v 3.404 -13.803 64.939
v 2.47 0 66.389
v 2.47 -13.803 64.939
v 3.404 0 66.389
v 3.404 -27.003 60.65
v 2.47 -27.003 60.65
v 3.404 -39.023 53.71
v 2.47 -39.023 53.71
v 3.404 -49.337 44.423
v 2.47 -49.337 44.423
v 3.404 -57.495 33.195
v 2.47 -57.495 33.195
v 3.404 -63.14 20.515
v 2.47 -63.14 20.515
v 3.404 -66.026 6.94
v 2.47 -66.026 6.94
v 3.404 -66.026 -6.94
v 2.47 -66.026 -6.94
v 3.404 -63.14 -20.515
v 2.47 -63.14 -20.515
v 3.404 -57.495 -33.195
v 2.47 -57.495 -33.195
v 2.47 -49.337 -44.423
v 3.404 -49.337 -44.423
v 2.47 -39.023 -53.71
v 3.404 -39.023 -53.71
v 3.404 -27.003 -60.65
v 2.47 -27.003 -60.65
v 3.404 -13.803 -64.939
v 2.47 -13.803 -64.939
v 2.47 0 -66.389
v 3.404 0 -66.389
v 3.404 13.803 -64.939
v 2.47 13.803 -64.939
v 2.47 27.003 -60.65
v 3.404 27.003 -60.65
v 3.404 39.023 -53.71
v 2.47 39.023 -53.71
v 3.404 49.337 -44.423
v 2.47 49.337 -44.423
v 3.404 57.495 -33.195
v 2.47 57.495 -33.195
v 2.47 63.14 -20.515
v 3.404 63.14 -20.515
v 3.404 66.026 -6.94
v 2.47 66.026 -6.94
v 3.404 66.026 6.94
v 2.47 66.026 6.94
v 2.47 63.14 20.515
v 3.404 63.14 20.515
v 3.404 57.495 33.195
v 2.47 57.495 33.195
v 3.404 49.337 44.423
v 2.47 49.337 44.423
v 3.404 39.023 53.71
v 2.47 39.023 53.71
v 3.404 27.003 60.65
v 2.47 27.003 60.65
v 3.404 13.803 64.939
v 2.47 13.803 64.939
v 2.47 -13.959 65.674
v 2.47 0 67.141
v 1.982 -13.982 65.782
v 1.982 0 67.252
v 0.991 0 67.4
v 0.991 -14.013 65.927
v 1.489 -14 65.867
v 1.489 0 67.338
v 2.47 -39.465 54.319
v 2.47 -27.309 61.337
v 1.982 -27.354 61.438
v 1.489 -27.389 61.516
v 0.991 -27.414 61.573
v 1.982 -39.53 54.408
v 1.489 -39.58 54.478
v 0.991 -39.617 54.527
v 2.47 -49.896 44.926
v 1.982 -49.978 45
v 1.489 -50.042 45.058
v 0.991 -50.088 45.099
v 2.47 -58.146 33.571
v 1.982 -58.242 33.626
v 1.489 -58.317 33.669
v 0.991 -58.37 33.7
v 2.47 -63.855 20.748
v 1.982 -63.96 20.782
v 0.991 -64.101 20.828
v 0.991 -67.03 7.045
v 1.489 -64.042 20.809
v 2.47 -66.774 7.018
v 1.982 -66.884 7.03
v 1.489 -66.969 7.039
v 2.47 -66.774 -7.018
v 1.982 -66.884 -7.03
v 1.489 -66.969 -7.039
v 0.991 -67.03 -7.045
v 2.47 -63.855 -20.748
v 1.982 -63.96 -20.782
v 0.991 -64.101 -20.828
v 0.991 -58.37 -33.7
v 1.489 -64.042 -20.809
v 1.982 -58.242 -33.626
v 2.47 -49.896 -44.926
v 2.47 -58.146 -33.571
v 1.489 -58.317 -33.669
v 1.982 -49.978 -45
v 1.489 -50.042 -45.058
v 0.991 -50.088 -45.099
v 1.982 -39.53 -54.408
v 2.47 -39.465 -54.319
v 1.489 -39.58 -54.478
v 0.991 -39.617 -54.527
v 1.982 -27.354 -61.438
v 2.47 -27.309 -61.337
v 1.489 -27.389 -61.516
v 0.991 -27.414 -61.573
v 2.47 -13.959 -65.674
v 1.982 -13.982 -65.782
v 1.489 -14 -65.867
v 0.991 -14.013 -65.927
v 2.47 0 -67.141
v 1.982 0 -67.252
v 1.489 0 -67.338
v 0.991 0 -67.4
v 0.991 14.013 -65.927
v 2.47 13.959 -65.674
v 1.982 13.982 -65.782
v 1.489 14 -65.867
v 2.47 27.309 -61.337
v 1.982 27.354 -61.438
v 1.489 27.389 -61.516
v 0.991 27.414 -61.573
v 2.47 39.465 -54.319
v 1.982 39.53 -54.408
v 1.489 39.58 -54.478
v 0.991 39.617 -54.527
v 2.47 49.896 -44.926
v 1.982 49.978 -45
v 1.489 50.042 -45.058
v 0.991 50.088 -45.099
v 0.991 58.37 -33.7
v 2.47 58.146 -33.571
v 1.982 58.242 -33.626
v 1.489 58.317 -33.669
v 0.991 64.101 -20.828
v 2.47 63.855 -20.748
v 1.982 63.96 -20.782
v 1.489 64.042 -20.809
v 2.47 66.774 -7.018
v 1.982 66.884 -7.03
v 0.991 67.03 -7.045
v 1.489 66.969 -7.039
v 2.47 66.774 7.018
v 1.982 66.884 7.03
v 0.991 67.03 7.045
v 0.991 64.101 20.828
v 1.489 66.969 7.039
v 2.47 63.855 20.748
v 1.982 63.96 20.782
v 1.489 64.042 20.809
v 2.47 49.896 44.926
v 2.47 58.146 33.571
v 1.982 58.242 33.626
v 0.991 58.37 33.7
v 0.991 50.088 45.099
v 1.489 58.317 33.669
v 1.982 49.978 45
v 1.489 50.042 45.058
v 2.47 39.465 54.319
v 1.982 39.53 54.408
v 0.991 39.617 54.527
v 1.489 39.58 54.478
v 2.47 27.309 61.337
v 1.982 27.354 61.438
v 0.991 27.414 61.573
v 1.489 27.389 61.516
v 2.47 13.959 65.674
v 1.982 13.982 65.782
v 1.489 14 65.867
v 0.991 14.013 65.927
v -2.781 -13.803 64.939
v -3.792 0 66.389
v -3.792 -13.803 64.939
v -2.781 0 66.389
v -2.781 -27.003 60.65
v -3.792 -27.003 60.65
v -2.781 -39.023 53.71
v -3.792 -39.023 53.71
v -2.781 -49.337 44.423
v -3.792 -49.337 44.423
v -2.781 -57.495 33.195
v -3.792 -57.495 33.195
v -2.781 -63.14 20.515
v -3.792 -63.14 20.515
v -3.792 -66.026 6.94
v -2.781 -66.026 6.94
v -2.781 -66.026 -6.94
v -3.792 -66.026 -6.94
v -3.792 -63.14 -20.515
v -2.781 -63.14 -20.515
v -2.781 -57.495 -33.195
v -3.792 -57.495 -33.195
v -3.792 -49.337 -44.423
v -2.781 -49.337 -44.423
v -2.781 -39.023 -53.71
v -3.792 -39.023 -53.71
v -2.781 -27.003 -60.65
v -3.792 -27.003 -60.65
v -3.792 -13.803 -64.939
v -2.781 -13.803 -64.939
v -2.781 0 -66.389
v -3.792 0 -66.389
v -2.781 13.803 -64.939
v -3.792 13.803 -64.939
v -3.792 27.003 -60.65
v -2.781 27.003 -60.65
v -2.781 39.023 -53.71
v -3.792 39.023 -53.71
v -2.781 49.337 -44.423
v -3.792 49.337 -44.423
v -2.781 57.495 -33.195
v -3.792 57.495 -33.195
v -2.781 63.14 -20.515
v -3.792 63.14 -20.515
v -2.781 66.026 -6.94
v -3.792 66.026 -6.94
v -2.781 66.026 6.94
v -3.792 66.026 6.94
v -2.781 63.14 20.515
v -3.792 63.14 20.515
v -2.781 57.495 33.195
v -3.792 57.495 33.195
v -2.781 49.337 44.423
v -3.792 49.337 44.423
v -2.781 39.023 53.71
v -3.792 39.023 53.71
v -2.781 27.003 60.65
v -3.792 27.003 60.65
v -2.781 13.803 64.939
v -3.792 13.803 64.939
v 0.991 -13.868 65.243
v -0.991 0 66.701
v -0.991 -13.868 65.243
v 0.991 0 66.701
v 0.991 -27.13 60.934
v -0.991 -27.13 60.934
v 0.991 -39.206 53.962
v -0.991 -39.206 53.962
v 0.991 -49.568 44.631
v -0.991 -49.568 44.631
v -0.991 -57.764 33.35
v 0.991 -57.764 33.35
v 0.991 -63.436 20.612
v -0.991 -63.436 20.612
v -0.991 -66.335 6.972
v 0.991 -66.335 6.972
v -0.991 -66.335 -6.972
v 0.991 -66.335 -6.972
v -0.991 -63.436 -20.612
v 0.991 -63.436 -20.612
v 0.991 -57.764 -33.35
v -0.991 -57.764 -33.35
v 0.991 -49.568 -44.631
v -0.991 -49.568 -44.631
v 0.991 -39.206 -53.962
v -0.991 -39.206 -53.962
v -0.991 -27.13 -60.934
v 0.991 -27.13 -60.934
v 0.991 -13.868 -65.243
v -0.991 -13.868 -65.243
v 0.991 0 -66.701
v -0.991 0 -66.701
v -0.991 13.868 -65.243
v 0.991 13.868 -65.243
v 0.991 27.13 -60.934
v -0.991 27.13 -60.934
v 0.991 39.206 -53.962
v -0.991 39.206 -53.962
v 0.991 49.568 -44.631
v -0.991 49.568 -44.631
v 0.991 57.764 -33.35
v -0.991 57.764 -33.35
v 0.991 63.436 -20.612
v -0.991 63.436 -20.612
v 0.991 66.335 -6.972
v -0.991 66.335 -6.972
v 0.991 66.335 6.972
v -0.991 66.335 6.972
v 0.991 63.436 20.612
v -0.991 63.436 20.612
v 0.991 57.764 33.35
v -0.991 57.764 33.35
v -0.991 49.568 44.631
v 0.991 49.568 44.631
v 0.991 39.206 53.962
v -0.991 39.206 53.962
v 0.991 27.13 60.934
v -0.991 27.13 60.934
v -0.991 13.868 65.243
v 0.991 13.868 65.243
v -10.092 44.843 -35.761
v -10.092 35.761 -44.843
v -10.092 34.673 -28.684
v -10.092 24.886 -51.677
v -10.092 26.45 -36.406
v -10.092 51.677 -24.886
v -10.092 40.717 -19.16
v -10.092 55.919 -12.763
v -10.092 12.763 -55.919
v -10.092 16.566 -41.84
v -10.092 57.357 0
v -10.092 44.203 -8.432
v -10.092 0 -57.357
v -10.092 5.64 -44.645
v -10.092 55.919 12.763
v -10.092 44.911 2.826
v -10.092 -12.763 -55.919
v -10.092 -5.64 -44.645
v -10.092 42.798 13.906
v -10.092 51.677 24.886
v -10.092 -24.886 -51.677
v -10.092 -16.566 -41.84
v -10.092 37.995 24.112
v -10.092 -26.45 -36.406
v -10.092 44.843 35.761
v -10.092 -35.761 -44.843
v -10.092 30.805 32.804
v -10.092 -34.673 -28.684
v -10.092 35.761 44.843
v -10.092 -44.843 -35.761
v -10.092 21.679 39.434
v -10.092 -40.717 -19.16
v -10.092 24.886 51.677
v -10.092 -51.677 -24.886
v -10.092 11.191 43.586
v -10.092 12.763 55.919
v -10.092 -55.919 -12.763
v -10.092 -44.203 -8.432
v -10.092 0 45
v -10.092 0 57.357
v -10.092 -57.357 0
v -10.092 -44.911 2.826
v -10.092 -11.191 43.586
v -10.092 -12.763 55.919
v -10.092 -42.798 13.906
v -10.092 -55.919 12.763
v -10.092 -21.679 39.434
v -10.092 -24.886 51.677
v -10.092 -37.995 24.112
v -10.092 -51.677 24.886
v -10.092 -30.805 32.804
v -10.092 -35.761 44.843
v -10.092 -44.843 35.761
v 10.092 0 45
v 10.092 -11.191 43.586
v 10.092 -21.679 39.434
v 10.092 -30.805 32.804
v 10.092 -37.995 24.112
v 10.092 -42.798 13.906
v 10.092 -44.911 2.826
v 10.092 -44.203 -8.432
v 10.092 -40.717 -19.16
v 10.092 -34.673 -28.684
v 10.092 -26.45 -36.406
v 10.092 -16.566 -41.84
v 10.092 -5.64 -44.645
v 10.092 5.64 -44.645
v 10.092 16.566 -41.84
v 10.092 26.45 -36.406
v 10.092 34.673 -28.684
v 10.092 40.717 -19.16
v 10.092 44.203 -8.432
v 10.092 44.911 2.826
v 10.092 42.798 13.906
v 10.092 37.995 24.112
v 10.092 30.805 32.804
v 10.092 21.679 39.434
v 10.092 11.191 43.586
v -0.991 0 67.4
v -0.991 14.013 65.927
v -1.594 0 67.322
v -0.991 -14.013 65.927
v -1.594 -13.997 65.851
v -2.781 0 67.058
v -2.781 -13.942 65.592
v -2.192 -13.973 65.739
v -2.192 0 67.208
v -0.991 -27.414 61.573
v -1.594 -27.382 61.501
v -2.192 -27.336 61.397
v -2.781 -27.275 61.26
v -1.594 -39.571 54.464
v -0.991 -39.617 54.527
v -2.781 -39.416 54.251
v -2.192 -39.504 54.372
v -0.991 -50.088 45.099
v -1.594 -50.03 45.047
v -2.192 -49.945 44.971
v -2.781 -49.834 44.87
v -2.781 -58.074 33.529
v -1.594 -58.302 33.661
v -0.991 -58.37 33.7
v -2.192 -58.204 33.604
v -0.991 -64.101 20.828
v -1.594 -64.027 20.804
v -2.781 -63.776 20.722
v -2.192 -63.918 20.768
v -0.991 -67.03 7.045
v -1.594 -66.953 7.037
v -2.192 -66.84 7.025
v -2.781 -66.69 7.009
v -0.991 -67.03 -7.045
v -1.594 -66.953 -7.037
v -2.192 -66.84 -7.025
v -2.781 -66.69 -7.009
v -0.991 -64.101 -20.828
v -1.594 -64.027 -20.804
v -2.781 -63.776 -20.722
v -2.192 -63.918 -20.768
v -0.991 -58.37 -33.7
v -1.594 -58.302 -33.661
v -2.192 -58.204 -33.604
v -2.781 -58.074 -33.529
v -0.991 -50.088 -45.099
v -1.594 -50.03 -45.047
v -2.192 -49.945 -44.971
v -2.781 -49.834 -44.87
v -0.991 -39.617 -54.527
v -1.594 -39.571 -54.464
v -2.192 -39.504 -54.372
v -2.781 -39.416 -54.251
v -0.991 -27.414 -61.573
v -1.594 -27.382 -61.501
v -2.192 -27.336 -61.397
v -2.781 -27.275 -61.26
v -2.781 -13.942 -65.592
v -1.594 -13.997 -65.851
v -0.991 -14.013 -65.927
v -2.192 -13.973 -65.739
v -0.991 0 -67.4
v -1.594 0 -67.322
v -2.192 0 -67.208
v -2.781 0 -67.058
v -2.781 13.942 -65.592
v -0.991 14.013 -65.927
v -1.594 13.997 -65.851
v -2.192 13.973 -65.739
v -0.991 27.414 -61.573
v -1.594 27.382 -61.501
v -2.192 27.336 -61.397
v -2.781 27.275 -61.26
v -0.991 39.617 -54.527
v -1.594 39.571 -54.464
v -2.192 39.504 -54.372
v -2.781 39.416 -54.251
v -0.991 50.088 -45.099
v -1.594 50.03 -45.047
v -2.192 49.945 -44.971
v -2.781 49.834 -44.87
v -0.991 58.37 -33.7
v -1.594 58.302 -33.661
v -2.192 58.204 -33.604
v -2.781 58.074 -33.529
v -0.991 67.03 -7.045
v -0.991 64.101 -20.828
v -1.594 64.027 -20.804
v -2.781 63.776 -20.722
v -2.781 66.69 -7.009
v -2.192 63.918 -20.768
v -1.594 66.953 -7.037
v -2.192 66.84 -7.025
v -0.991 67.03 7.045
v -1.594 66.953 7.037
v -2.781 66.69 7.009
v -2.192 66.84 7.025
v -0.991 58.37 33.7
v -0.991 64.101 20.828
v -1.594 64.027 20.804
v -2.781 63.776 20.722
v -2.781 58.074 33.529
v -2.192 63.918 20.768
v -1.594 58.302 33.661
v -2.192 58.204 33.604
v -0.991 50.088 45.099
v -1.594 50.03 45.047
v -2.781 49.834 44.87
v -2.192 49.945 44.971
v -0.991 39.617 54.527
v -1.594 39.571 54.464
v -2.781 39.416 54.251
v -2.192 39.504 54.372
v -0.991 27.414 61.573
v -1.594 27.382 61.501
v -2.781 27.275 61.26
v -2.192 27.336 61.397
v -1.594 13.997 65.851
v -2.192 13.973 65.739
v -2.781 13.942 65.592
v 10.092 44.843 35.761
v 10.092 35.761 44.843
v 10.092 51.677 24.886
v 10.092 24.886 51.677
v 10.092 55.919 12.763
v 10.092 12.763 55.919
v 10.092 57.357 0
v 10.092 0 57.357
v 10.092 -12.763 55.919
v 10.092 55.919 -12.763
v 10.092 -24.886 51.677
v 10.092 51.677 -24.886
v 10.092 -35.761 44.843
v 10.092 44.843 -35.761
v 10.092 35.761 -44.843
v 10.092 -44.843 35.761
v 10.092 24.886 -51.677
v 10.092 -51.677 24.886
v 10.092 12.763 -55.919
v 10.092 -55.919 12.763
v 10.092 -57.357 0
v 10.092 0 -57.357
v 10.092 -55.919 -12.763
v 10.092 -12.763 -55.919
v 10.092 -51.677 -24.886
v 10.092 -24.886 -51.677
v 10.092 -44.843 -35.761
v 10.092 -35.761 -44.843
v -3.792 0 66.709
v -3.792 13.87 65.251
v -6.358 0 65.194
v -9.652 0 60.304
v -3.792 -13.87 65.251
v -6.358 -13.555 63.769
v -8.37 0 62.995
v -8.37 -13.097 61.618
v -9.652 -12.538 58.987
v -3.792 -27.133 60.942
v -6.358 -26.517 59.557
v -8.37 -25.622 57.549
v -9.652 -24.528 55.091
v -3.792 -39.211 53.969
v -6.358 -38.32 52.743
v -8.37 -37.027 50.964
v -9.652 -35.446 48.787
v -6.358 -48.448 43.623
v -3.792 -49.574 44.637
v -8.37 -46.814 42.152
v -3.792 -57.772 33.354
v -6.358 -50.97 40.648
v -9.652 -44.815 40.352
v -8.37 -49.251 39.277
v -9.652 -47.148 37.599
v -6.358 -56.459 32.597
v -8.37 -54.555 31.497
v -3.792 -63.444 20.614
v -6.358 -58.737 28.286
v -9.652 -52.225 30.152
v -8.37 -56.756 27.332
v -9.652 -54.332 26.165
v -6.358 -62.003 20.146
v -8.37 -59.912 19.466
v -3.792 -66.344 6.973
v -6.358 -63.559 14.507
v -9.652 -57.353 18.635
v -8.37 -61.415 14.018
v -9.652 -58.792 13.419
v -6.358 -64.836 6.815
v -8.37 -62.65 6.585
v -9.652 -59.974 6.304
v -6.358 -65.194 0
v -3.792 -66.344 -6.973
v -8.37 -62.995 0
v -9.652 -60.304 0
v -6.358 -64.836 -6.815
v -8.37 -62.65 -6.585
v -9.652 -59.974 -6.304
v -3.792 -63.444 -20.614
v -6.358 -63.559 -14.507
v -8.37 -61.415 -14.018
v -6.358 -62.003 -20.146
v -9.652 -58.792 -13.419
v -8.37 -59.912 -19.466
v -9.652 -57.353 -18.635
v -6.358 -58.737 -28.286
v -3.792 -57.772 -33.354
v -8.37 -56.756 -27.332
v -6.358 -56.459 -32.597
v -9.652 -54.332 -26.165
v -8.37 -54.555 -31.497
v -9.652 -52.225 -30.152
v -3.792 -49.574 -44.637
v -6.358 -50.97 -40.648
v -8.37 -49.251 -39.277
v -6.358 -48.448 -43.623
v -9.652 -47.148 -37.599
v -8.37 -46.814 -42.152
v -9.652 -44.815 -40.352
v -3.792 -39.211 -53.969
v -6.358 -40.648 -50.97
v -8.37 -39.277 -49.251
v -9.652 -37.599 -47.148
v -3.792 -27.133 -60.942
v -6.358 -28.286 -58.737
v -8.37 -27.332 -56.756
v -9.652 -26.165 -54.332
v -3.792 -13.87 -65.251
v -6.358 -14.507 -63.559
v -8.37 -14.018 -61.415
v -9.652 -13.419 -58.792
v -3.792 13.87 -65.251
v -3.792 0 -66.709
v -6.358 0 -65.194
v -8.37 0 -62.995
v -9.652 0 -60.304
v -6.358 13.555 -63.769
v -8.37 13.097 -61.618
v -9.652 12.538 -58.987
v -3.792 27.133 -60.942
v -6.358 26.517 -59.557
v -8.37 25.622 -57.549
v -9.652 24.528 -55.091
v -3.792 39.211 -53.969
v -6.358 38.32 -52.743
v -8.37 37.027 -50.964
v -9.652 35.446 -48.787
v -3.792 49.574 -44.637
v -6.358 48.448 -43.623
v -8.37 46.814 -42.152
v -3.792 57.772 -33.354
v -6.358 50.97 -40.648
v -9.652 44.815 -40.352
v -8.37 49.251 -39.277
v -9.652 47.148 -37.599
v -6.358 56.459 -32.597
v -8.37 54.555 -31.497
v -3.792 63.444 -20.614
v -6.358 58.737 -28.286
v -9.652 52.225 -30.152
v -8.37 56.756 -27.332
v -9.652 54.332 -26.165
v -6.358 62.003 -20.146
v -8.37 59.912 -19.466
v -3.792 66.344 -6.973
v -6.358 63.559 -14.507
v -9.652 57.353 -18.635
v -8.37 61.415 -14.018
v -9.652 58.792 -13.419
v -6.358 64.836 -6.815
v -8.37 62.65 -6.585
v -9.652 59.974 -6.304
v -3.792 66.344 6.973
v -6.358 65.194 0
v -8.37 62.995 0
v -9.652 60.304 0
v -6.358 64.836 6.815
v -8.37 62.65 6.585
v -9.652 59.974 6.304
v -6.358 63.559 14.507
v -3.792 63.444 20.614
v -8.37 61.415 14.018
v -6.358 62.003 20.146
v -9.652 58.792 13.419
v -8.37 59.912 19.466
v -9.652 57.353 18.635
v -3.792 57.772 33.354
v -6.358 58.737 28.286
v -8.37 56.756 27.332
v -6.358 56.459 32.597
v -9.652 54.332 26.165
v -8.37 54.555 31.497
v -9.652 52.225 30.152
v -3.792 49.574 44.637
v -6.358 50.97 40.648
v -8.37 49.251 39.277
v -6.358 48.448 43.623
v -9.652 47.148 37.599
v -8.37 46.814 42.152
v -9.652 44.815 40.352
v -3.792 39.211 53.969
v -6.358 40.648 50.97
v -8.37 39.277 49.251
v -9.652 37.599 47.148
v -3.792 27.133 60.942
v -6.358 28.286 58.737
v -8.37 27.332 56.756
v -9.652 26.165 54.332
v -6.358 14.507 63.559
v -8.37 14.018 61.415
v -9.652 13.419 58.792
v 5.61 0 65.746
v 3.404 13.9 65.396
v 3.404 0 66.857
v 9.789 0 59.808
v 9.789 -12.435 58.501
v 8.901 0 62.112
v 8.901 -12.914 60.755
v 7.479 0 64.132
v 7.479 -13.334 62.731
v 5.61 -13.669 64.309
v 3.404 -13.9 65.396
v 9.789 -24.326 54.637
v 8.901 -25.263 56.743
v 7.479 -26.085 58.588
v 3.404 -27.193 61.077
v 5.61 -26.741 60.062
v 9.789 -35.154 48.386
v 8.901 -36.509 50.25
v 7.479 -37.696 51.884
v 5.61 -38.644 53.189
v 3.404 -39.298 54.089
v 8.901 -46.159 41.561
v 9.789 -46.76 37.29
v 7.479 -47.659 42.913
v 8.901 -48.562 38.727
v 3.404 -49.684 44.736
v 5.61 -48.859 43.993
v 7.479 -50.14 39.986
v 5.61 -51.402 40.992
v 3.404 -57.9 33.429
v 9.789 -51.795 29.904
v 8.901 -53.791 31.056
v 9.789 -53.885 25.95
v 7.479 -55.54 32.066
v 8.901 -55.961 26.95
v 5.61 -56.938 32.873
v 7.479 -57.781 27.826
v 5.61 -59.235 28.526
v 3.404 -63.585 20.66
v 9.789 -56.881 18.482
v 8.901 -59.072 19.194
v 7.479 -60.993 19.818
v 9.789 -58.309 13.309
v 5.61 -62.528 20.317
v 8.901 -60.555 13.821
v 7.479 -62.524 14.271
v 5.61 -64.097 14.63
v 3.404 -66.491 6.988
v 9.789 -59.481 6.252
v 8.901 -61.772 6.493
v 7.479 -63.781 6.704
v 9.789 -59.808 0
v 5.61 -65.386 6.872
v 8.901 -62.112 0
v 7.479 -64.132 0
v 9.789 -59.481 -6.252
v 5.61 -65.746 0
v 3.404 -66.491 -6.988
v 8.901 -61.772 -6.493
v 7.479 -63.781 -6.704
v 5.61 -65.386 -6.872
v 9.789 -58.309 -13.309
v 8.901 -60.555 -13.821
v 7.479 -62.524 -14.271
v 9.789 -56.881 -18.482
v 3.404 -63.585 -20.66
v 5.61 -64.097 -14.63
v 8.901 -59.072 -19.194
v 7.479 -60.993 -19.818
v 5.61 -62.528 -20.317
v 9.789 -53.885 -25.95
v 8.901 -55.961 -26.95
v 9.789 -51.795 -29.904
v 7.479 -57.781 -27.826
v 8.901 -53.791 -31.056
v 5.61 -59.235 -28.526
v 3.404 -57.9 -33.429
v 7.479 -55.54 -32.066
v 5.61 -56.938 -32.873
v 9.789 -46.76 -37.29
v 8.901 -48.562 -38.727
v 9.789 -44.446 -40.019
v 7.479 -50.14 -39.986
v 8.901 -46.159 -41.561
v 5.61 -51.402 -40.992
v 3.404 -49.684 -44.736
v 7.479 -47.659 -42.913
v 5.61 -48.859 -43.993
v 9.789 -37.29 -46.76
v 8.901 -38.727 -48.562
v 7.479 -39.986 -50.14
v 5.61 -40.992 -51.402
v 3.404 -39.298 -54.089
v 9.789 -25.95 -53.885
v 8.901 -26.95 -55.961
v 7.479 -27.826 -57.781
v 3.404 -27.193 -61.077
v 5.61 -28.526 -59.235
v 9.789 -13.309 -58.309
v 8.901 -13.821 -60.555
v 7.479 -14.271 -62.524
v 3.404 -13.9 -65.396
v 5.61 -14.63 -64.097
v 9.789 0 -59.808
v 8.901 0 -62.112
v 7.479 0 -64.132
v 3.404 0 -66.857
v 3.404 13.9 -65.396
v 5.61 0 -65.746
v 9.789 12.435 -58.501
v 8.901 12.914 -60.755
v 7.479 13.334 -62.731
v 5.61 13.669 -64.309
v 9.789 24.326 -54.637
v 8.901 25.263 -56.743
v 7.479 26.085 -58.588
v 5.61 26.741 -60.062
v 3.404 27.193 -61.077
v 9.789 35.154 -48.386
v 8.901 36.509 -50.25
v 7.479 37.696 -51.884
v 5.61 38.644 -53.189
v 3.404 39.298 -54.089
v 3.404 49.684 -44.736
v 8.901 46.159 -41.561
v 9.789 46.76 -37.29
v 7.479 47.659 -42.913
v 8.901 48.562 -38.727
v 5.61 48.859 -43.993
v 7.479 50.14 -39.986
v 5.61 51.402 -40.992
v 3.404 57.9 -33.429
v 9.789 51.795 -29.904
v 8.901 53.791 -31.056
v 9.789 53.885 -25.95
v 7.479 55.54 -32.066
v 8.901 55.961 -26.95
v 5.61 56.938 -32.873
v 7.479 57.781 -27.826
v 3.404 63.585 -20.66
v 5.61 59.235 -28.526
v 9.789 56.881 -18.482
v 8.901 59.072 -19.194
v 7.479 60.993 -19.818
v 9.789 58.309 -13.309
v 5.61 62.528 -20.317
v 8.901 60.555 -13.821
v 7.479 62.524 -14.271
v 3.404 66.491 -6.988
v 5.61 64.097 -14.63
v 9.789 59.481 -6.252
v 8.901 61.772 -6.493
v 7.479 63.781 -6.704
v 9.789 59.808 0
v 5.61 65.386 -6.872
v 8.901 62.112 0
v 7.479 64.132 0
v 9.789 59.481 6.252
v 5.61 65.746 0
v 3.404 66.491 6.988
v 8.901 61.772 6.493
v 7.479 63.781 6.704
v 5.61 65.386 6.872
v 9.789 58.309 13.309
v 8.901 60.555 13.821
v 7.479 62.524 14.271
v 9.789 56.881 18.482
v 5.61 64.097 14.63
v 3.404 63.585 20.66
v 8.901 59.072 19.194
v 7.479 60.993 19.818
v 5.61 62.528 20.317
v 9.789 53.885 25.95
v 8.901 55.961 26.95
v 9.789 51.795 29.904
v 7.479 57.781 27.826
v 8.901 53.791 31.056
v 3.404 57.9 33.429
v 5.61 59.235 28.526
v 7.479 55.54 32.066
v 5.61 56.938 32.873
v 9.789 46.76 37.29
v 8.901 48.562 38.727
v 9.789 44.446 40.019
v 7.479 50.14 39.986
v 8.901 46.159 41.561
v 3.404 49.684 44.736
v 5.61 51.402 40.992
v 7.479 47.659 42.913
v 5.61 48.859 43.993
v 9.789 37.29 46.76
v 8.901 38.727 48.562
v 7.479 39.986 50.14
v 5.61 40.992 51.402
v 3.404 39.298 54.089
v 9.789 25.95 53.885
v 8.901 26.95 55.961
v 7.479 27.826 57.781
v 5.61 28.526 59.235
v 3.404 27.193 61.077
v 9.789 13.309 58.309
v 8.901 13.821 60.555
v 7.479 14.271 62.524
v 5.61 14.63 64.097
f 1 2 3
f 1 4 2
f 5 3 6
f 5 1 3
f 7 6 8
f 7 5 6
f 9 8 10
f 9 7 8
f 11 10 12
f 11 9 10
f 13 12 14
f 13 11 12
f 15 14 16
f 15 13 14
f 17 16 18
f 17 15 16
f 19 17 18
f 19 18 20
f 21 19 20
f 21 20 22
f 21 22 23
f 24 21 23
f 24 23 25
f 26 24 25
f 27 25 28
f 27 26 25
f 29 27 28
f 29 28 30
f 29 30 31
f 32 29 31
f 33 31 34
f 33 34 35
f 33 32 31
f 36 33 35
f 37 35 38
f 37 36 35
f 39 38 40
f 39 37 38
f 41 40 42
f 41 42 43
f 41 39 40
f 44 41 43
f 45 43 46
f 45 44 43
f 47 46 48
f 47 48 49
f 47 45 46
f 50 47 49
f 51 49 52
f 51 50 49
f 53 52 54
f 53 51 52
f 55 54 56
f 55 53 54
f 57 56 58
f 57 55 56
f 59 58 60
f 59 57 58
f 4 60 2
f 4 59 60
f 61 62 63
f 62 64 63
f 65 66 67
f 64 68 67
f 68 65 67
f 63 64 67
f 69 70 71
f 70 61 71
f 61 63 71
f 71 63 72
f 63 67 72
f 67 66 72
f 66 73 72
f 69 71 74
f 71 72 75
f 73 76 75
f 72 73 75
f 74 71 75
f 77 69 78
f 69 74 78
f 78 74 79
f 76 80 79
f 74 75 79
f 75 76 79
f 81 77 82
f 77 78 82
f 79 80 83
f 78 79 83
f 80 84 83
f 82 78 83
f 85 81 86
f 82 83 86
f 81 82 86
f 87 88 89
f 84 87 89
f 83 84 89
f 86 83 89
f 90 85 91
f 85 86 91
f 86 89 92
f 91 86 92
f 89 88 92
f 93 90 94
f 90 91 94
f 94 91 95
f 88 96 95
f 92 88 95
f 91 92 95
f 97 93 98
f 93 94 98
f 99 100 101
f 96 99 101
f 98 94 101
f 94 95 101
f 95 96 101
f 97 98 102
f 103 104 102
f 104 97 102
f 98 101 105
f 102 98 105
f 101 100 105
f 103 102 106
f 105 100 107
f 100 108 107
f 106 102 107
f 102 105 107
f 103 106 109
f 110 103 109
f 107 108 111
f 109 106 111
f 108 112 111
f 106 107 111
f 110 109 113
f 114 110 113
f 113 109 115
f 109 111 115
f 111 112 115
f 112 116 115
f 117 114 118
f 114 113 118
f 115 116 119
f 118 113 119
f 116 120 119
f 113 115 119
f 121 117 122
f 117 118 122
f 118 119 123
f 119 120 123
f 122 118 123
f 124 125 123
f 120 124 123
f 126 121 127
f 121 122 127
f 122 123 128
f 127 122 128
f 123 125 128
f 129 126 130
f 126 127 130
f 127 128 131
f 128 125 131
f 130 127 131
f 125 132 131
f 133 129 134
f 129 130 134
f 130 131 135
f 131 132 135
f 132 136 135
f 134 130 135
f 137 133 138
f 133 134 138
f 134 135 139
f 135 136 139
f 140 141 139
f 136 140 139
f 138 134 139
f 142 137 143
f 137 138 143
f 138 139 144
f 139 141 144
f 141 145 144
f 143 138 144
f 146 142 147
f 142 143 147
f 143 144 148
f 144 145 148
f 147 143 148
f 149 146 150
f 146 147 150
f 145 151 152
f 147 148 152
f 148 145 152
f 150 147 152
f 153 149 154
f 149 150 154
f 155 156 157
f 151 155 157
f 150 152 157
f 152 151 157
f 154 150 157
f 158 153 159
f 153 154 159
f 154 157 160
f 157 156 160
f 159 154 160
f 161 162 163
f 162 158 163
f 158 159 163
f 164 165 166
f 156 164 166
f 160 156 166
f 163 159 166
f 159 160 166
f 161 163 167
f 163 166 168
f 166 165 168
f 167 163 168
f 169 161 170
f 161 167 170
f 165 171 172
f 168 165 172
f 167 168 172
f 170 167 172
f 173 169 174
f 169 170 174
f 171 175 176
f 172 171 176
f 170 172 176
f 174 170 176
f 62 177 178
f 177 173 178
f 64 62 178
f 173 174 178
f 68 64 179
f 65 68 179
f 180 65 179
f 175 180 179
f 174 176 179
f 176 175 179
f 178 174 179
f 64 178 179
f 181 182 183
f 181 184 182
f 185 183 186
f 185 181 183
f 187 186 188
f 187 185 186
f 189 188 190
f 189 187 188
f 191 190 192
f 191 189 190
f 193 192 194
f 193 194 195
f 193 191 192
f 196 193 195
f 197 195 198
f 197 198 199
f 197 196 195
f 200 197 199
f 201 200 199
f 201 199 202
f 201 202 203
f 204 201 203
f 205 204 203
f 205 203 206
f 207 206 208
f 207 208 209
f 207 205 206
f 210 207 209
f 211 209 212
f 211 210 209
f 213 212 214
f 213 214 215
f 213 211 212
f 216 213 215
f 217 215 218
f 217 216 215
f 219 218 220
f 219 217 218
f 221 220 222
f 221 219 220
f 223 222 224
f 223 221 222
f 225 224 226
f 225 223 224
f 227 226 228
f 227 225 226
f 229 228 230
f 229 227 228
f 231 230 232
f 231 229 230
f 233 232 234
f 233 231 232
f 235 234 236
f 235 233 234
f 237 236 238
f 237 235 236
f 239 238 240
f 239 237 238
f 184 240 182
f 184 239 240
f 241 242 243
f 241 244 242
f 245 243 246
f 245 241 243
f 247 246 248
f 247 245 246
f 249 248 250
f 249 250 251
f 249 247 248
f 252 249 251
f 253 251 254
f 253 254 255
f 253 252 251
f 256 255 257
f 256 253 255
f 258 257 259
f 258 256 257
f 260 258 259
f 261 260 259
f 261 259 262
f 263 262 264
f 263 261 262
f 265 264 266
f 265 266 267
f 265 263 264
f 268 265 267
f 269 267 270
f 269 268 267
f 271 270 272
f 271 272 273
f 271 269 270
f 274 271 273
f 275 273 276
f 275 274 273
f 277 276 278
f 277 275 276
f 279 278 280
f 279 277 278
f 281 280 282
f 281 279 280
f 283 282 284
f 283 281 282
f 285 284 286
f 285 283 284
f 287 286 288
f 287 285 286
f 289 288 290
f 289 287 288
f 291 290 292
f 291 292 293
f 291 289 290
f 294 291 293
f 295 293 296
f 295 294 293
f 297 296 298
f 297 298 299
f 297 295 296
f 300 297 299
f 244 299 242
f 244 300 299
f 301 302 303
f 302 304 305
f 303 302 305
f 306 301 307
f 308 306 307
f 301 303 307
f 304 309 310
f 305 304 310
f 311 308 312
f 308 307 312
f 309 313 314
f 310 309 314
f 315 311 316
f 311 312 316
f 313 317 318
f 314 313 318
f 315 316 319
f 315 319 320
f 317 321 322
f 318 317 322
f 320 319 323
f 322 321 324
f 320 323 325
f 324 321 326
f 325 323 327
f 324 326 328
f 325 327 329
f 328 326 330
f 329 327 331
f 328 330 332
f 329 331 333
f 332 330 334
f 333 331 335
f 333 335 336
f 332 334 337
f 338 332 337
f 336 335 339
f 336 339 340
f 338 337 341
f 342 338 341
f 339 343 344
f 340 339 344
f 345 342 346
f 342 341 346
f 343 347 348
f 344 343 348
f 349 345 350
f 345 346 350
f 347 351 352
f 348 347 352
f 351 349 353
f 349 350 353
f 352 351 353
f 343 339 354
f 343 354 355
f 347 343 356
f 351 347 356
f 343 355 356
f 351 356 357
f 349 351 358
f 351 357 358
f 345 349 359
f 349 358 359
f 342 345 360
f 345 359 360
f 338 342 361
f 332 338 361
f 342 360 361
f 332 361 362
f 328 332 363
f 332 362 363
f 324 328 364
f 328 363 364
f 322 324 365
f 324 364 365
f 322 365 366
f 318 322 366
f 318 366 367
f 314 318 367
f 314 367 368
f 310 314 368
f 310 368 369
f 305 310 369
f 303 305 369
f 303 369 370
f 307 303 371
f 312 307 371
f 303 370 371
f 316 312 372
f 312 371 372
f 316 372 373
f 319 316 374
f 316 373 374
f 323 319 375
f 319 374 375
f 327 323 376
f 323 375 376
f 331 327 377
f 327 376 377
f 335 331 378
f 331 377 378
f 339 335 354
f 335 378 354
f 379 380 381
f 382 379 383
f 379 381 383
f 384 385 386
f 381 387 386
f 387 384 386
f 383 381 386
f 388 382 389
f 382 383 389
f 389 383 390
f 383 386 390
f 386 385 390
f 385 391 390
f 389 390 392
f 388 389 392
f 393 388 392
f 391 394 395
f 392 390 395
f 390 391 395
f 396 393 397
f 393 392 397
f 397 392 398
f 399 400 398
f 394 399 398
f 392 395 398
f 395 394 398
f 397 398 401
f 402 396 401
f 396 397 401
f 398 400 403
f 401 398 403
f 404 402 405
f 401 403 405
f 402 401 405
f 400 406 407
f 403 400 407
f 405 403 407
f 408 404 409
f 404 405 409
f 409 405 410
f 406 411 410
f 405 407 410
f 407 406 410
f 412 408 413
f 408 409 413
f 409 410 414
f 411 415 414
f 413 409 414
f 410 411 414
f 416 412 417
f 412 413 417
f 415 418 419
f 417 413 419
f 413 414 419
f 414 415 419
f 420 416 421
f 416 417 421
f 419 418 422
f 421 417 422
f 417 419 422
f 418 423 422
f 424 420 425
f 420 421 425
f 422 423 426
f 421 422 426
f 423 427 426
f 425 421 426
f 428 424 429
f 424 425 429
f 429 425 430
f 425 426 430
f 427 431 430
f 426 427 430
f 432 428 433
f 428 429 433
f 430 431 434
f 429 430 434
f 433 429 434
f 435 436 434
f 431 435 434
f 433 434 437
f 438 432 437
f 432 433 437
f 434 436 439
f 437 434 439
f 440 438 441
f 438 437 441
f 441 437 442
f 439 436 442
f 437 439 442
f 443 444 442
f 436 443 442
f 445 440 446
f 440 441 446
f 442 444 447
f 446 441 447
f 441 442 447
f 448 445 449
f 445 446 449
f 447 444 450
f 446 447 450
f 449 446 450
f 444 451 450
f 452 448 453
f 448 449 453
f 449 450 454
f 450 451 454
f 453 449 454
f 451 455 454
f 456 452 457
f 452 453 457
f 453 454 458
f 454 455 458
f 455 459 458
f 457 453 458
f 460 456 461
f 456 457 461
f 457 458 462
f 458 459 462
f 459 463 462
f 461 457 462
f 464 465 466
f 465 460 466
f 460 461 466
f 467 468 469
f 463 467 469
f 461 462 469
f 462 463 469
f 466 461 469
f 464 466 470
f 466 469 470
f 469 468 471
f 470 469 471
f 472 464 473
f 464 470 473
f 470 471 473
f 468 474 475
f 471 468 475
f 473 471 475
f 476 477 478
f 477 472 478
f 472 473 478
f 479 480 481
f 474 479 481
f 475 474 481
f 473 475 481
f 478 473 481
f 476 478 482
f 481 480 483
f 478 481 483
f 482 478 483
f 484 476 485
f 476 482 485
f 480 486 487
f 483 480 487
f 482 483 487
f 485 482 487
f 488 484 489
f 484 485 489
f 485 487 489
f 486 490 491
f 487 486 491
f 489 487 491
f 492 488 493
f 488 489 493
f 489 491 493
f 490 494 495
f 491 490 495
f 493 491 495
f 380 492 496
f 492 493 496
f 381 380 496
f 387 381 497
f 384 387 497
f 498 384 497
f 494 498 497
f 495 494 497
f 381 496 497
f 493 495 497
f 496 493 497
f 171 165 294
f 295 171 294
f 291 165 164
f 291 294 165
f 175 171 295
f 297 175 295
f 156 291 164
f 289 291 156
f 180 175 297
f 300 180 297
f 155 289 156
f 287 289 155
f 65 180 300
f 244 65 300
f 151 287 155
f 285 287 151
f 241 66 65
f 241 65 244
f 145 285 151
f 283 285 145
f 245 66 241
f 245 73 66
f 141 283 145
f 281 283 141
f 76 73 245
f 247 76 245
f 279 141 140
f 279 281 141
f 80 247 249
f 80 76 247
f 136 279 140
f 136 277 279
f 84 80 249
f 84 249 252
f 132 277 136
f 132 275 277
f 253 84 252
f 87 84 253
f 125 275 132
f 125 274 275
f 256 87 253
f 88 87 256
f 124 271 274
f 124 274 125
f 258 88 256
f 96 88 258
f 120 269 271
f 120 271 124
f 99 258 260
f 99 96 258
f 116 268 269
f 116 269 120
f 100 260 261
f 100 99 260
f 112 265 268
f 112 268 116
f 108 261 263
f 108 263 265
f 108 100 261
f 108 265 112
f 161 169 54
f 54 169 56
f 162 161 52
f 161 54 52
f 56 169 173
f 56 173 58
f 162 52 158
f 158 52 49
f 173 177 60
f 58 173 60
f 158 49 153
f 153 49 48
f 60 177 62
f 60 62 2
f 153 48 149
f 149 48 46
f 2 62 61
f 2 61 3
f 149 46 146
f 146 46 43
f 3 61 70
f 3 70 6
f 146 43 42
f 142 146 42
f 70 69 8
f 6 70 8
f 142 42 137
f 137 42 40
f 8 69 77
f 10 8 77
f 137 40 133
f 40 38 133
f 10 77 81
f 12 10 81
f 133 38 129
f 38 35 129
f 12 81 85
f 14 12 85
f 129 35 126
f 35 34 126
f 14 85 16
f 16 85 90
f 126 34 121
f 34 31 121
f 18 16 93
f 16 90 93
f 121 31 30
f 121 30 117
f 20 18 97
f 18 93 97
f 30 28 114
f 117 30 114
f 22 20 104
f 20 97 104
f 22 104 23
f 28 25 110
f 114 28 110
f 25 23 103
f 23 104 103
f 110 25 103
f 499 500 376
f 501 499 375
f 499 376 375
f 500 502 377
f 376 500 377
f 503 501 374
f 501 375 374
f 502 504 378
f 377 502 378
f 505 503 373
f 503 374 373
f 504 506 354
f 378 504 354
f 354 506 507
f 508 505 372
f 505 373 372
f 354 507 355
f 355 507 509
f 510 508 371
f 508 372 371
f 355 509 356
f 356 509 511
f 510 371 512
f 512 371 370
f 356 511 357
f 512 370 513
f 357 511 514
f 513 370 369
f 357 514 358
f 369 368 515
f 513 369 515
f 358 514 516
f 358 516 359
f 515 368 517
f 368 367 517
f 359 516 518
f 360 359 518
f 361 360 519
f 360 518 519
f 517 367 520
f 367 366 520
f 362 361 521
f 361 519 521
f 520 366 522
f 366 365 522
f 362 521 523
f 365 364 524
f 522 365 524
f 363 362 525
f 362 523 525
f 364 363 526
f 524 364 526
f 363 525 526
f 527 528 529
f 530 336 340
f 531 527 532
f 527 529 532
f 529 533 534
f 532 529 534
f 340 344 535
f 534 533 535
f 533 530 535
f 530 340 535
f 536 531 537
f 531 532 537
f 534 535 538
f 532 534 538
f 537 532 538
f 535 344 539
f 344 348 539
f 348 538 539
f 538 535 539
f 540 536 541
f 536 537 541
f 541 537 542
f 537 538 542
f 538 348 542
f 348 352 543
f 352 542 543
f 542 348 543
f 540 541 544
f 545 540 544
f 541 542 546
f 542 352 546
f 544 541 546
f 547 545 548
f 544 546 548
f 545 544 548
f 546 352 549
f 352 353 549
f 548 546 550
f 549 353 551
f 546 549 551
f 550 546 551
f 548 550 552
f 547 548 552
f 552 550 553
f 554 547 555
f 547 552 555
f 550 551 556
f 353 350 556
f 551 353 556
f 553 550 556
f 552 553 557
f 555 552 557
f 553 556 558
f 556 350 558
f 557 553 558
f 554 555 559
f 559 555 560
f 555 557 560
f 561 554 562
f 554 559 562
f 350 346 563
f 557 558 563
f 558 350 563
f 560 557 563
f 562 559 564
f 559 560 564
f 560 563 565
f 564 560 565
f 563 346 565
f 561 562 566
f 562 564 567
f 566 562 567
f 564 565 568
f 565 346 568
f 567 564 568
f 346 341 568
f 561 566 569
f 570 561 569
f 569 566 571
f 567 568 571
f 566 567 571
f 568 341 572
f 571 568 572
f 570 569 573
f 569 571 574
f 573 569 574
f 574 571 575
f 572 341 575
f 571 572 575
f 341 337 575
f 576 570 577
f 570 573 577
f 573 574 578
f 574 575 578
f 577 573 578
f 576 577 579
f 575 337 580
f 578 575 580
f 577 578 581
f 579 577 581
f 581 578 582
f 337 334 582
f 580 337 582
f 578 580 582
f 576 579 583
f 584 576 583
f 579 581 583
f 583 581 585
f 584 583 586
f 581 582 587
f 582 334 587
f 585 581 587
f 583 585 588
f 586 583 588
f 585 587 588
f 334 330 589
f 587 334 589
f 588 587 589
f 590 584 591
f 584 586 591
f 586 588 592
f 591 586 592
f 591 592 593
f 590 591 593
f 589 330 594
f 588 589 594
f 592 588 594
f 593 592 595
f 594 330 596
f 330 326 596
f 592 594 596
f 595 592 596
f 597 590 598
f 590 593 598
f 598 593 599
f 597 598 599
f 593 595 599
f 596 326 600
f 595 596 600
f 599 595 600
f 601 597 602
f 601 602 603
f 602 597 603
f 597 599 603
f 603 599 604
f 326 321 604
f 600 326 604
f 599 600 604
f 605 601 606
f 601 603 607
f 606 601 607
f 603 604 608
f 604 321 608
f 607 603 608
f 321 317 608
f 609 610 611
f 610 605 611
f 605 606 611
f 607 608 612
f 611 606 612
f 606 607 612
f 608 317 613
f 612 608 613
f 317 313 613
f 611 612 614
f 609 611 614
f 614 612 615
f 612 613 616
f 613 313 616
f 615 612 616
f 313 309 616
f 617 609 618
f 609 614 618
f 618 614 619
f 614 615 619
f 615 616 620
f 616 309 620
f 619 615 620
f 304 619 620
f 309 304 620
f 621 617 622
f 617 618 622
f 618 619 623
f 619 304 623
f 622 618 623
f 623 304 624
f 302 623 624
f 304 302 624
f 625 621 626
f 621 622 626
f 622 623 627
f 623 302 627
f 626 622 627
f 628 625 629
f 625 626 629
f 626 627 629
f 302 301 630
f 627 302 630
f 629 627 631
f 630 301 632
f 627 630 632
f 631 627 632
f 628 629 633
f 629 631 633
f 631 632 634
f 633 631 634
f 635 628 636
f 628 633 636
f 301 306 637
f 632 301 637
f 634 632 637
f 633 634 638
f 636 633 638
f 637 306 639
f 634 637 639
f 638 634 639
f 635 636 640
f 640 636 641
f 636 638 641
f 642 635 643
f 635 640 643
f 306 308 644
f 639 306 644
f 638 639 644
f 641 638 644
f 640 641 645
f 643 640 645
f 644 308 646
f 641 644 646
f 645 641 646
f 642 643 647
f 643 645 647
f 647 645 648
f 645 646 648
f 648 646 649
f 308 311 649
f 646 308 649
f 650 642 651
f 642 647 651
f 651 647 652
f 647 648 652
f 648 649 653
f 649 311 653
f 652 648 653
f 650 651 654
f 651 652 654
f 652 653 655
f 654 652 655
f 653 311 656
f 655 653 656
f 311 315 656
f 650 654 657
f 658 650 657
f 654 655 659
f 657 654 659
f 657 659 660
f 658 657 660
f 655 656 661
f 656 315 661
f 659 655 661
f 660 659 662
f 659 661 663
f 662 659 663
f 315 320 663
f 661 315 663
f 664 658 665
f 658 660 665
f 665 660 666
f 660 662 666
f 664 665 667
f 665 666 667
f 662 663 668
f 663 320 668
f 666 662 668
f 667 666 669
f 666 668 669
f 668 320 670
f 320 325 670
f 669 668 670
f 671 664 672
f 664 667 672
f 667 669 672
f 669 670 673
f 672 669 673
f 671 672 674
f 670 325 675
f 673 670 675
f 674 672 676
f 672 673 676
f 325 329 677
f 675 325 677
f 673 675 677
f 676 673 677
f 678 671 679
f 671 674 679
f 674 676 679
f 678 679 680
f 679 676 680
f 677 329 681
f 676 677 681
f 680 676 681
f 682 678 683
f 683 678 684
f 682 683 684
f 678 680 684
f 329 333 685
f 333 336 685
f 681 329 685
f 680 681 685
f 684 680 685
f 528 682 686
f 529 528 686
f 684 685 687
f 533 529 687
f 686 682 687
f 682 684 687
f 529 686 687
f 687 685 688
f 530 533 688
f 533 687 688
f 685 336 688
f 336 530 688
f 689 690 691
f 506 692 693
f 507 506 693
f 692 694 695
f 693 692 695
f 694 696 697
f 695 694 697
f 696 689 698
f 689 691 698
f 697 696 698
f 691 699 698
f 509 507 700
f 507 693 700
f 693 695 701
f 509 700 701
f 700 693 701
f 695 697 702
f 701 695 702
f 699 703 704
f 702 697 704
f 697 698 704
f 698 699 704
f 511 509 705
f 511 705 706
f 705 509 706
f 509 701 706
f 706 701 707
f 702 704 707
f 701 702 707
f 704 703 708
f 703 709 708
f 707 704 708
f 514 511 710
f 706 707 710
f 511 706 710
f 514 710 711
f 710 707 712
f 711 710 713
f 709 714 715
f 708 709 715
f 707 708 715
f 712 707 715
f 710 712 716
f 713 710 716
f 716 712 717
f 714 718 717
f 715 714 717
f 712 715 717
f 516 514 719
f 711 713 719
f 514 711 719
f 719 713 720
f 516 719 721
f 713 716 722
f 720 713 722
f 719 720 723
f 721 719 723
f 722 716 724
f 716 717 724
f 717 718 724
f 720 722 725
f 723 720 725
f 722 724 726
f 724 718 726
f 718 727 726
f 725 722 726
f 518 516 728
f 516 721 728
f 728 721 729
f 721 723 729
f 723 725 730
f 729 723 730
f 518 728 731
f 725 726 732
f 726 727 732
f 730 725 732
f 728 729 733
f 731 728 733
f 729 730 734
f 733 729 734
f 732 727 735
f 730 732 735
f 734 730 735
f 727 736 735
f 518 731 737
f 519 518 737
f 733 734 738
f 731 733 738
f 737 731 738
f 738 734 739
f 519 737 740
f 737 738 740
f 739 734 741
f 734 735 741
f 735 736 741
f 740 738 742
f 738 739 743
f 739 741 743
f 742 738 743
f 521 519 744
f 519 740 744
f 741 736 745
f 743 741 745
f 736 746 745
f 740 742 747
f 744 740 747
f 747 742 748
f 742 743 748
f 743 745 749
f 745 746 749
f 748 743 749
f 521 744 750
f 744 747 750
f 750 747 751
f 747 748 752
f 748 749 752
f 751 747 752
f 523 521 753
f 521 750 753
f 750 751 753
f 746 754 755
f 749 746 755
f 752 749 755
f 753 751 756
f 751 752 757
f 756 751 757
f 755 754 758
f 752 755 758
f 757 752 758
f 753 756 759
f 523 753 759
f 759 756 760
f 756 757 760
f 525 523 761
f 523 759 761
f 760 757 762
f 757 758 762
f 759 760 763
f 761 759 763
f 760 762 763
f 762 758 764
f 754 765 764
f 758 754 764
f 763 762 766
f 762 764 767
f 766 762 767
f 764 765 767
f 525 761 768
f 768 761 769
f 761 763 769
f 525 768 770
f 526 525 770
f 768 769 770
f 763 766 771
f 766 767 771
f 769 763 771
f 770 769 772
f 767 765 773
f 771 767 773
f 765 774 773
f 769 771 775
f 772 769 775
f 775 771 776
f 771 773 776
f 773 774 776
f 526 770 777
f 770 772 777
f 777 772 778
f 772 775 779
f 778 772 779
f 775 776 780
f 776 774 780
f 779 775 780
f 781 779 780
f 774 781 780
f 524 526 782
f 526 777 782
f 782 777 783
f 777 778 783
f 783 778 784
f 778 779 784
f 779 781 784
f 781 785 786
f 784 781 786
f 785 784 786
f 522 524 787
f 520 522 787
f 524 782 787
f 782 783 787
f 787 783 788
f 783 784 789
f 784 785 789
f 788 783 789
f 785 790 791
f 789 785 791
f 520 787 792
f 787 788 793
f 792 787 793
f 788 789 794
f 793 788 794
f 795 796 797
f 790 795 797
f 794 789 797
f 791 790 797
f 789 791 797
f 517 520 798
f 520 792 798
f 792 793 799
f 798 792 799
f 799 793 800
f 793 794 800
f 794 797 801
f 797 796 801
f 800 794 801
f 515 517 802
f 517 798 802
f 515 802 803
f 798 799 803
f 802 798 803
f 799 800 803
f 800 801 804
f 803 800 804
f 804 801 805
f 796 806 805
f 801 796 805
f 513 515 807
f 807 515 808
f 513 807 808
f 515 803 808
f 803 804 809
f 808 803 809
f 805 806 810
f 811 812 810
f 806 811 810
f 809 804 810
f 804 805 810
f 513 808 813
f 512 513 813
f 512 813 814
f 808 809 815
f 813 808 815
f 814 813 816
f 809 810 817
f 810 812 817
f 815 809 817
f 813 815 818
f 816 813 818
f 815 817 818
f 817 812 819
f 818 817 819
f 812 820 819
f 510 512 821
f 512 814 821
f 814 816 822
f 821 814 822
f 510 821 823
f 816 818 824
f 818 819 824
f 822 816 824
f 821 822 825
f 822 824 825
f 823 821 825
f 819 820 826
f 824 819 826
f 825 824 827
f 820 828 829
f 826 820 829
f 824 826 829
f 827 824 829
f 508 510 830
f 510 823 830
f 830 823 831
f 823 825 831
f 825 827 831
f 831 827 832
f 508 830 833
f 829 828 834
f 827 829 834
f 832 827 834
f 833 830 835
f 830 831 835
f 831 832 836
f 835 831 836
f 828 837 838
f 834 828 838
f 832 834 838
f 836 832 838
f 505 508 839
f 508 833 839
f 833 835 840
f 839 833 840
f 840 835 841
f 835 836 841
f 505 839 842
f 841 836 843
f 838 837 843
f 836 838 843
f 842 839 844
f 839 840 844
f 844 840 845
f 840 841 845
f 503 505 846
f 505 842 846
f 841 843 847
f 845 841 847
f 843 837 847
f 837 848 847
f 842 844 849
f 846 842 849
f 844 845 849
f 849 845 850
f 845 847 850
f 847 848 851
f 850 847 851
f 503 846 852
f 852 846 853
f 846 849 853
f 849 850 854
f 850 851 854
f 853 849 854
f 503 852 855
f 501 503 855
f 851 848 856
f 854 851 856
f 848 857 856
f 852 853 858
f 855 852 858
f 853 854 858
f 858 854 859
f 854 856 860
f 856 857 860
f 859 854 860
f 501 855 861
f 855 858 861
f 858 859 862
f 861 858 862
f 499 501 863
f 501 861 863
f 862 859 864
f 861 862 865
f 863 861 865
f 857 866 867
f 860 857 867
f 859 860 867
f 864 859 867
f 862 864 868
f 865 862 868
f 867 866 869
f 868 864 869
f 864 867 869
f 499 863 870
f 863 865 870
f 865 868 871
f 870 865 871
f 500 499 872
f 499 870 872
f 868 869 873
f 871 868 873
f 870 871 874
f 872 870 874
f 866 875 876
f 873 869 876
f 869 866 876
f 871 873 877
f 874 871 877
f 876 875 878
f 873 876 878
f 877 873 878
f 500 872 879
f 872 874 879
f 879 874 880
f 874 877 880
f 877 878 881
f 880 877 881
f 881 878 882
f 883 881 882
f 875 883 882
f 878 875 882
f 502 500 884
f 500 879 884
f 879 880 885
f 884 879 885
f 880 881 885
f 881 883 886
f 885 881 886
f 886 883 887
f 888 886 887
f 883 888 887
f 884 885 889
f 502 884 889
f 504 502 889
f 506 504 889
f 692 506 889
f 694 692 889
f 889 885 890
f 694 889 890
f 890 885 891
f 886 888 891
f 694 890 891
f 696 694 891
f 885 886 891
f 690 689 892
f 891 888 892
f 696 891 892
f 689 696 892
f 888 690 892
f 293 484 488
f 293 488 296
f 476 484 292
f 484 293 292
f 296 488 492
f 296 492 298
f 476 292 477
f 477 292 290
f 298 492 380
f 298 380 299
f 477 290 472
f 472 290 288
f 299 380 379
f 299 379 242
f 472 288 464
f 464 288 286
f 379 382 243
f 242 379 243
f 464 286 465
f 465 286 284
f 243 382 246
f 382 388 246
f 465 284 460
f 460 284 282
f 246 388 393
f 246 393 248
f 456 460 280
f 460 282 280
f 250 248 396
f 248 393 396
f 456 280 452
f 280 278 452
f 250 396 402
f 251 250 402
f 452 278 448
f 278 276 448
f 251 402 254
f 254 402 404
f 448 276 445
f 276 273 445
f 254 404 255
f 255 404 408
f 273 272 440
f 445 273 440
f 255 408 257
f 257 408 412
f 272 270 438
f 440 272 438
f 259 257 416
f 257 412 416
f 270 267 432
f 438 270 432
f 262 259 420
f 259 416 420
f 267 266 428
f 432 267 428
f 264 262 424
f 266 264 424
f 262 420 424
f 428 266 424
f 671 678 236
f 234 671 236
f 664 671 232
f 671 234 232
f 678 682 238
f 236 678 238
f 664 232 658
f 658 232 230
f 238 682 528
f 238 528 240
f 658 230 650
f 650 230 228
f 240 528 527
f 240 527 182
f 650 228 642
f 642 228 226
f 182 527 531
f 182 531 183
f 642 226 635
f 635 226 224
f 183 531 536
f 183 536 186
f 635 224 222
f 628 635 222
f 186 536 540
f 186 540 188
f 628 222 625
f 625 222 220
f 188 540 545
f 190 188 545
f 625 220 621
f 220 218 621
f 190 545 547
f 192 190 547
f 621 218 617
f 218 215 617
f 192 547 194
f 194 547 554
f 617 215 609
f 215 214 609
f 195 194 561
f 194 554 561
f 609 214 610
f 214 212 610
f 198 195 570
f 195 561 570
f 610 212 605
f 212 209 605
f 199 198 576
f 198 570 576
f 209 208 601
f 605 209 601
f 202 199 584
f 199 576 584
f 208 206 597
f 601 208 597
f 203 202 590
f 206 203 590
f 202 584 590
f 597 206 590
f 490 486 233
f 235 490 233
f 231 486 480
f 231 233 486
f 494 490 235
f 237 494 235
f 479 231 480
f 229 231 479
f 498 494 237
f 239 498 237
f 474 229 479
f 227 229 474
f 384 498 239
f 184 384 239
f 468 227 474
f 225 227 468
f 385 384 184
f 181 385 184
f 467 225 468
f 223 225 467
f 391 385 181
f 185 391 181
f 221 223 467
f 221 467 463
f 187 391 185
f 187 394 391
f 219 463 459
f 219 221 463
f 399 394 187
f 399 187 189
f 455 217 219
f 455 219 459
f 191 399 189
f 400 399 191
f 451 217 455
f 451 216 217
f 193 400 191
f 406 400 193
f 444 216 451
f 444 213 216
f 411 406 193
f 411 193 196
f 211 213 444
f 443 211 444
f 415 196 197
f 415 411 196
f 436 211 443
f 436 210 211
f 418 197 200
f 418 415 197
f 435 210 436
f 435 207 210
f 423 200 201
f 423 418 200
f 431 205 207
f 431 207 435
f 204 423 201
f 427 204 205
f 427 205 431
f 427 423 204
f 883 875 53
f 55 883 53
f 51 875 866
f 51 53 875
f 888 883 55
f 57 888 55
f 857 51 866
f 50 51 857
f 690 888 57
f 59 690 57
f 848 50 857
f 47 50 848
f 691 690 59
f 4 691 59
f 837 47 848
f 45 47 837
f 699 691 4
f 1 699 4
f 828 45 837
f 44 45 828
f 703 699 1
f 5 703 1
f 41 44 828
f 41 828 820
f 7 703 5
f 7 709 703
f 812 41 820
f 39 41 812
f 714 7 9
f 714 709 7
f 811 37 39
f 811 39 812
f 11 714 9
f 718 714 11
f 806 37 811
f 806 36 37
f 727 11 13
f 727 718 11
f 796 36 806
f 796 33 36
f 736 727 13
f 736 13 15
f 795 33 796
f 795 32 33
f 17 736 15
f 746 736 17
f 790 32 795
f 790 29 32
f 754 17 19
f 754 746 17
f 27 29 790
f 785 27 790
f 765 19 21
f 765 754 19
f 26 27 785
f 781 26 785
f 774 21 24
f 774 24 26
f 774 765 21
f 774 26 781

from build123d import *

# Parameters (mm, degrees)
SKETCH2_W   = 1.982852704
SKETCH2_H   = 4.045354148
SKETCH2_W_2 = 0.933543265
SKETCH2_H_2 = 4.667716324
SKETCH2_W_3 = 1.011338537


with BuildPart() as part:
    # Sketch1 → Revolve1 (revolve)
    with BuildSketch(Plane.XY, mode=Mode.PRIVATE) as revolve1_sk:
        with BuildLine():
            Line((-10.091533181, 57.356979405), (-10.091533181, 45))
            Line((-10.091533181, 45), (10.091533181, 45))
            Line((10.091533181, 45), (10.091533181, 57.356979405))
            ThreePointArc((10.091533181, 57.356979405), (0, 67.448512586), (-10.091533181, 57.356979405))
        make_face()
    revolve(revolve1_sk.sketch.rotate(Axis((-52.285660481, 0, 0), (1, 0, 0)), 90), axis=Axis((-52.285660481, 0, 0), (1, 0, 0)))

    # Sketch2 → Cut-Revolve1 (revolve, cut)
    with BuildSketch(Plane.XY, mode=Mode.PRIVATE) as cut_revolve1_sk:
        with Locations((0, 68.723356154)):
            Rectangle(SKETCH2_W, SKETCH2_H)
        with Locations((2.937234888, 68.723356154)):
            Rectangle(SKETCH2_W_2, SKETCH2_H_2)
        with Locations((-3.286386879, 68.723356154)):
            Rectangle(SKETCH2_W_3, SKETCH2_H_2)
    revolve(cut_revolve1_sk.sketch.rotate(Axis((38.367575356, 0, 0), (1, 0, 0)), 90), axis=Axis((38.367575356, 0, 0), (1, 0, 0)), mode=Mode.SUBTRACT)


solid = part.part
